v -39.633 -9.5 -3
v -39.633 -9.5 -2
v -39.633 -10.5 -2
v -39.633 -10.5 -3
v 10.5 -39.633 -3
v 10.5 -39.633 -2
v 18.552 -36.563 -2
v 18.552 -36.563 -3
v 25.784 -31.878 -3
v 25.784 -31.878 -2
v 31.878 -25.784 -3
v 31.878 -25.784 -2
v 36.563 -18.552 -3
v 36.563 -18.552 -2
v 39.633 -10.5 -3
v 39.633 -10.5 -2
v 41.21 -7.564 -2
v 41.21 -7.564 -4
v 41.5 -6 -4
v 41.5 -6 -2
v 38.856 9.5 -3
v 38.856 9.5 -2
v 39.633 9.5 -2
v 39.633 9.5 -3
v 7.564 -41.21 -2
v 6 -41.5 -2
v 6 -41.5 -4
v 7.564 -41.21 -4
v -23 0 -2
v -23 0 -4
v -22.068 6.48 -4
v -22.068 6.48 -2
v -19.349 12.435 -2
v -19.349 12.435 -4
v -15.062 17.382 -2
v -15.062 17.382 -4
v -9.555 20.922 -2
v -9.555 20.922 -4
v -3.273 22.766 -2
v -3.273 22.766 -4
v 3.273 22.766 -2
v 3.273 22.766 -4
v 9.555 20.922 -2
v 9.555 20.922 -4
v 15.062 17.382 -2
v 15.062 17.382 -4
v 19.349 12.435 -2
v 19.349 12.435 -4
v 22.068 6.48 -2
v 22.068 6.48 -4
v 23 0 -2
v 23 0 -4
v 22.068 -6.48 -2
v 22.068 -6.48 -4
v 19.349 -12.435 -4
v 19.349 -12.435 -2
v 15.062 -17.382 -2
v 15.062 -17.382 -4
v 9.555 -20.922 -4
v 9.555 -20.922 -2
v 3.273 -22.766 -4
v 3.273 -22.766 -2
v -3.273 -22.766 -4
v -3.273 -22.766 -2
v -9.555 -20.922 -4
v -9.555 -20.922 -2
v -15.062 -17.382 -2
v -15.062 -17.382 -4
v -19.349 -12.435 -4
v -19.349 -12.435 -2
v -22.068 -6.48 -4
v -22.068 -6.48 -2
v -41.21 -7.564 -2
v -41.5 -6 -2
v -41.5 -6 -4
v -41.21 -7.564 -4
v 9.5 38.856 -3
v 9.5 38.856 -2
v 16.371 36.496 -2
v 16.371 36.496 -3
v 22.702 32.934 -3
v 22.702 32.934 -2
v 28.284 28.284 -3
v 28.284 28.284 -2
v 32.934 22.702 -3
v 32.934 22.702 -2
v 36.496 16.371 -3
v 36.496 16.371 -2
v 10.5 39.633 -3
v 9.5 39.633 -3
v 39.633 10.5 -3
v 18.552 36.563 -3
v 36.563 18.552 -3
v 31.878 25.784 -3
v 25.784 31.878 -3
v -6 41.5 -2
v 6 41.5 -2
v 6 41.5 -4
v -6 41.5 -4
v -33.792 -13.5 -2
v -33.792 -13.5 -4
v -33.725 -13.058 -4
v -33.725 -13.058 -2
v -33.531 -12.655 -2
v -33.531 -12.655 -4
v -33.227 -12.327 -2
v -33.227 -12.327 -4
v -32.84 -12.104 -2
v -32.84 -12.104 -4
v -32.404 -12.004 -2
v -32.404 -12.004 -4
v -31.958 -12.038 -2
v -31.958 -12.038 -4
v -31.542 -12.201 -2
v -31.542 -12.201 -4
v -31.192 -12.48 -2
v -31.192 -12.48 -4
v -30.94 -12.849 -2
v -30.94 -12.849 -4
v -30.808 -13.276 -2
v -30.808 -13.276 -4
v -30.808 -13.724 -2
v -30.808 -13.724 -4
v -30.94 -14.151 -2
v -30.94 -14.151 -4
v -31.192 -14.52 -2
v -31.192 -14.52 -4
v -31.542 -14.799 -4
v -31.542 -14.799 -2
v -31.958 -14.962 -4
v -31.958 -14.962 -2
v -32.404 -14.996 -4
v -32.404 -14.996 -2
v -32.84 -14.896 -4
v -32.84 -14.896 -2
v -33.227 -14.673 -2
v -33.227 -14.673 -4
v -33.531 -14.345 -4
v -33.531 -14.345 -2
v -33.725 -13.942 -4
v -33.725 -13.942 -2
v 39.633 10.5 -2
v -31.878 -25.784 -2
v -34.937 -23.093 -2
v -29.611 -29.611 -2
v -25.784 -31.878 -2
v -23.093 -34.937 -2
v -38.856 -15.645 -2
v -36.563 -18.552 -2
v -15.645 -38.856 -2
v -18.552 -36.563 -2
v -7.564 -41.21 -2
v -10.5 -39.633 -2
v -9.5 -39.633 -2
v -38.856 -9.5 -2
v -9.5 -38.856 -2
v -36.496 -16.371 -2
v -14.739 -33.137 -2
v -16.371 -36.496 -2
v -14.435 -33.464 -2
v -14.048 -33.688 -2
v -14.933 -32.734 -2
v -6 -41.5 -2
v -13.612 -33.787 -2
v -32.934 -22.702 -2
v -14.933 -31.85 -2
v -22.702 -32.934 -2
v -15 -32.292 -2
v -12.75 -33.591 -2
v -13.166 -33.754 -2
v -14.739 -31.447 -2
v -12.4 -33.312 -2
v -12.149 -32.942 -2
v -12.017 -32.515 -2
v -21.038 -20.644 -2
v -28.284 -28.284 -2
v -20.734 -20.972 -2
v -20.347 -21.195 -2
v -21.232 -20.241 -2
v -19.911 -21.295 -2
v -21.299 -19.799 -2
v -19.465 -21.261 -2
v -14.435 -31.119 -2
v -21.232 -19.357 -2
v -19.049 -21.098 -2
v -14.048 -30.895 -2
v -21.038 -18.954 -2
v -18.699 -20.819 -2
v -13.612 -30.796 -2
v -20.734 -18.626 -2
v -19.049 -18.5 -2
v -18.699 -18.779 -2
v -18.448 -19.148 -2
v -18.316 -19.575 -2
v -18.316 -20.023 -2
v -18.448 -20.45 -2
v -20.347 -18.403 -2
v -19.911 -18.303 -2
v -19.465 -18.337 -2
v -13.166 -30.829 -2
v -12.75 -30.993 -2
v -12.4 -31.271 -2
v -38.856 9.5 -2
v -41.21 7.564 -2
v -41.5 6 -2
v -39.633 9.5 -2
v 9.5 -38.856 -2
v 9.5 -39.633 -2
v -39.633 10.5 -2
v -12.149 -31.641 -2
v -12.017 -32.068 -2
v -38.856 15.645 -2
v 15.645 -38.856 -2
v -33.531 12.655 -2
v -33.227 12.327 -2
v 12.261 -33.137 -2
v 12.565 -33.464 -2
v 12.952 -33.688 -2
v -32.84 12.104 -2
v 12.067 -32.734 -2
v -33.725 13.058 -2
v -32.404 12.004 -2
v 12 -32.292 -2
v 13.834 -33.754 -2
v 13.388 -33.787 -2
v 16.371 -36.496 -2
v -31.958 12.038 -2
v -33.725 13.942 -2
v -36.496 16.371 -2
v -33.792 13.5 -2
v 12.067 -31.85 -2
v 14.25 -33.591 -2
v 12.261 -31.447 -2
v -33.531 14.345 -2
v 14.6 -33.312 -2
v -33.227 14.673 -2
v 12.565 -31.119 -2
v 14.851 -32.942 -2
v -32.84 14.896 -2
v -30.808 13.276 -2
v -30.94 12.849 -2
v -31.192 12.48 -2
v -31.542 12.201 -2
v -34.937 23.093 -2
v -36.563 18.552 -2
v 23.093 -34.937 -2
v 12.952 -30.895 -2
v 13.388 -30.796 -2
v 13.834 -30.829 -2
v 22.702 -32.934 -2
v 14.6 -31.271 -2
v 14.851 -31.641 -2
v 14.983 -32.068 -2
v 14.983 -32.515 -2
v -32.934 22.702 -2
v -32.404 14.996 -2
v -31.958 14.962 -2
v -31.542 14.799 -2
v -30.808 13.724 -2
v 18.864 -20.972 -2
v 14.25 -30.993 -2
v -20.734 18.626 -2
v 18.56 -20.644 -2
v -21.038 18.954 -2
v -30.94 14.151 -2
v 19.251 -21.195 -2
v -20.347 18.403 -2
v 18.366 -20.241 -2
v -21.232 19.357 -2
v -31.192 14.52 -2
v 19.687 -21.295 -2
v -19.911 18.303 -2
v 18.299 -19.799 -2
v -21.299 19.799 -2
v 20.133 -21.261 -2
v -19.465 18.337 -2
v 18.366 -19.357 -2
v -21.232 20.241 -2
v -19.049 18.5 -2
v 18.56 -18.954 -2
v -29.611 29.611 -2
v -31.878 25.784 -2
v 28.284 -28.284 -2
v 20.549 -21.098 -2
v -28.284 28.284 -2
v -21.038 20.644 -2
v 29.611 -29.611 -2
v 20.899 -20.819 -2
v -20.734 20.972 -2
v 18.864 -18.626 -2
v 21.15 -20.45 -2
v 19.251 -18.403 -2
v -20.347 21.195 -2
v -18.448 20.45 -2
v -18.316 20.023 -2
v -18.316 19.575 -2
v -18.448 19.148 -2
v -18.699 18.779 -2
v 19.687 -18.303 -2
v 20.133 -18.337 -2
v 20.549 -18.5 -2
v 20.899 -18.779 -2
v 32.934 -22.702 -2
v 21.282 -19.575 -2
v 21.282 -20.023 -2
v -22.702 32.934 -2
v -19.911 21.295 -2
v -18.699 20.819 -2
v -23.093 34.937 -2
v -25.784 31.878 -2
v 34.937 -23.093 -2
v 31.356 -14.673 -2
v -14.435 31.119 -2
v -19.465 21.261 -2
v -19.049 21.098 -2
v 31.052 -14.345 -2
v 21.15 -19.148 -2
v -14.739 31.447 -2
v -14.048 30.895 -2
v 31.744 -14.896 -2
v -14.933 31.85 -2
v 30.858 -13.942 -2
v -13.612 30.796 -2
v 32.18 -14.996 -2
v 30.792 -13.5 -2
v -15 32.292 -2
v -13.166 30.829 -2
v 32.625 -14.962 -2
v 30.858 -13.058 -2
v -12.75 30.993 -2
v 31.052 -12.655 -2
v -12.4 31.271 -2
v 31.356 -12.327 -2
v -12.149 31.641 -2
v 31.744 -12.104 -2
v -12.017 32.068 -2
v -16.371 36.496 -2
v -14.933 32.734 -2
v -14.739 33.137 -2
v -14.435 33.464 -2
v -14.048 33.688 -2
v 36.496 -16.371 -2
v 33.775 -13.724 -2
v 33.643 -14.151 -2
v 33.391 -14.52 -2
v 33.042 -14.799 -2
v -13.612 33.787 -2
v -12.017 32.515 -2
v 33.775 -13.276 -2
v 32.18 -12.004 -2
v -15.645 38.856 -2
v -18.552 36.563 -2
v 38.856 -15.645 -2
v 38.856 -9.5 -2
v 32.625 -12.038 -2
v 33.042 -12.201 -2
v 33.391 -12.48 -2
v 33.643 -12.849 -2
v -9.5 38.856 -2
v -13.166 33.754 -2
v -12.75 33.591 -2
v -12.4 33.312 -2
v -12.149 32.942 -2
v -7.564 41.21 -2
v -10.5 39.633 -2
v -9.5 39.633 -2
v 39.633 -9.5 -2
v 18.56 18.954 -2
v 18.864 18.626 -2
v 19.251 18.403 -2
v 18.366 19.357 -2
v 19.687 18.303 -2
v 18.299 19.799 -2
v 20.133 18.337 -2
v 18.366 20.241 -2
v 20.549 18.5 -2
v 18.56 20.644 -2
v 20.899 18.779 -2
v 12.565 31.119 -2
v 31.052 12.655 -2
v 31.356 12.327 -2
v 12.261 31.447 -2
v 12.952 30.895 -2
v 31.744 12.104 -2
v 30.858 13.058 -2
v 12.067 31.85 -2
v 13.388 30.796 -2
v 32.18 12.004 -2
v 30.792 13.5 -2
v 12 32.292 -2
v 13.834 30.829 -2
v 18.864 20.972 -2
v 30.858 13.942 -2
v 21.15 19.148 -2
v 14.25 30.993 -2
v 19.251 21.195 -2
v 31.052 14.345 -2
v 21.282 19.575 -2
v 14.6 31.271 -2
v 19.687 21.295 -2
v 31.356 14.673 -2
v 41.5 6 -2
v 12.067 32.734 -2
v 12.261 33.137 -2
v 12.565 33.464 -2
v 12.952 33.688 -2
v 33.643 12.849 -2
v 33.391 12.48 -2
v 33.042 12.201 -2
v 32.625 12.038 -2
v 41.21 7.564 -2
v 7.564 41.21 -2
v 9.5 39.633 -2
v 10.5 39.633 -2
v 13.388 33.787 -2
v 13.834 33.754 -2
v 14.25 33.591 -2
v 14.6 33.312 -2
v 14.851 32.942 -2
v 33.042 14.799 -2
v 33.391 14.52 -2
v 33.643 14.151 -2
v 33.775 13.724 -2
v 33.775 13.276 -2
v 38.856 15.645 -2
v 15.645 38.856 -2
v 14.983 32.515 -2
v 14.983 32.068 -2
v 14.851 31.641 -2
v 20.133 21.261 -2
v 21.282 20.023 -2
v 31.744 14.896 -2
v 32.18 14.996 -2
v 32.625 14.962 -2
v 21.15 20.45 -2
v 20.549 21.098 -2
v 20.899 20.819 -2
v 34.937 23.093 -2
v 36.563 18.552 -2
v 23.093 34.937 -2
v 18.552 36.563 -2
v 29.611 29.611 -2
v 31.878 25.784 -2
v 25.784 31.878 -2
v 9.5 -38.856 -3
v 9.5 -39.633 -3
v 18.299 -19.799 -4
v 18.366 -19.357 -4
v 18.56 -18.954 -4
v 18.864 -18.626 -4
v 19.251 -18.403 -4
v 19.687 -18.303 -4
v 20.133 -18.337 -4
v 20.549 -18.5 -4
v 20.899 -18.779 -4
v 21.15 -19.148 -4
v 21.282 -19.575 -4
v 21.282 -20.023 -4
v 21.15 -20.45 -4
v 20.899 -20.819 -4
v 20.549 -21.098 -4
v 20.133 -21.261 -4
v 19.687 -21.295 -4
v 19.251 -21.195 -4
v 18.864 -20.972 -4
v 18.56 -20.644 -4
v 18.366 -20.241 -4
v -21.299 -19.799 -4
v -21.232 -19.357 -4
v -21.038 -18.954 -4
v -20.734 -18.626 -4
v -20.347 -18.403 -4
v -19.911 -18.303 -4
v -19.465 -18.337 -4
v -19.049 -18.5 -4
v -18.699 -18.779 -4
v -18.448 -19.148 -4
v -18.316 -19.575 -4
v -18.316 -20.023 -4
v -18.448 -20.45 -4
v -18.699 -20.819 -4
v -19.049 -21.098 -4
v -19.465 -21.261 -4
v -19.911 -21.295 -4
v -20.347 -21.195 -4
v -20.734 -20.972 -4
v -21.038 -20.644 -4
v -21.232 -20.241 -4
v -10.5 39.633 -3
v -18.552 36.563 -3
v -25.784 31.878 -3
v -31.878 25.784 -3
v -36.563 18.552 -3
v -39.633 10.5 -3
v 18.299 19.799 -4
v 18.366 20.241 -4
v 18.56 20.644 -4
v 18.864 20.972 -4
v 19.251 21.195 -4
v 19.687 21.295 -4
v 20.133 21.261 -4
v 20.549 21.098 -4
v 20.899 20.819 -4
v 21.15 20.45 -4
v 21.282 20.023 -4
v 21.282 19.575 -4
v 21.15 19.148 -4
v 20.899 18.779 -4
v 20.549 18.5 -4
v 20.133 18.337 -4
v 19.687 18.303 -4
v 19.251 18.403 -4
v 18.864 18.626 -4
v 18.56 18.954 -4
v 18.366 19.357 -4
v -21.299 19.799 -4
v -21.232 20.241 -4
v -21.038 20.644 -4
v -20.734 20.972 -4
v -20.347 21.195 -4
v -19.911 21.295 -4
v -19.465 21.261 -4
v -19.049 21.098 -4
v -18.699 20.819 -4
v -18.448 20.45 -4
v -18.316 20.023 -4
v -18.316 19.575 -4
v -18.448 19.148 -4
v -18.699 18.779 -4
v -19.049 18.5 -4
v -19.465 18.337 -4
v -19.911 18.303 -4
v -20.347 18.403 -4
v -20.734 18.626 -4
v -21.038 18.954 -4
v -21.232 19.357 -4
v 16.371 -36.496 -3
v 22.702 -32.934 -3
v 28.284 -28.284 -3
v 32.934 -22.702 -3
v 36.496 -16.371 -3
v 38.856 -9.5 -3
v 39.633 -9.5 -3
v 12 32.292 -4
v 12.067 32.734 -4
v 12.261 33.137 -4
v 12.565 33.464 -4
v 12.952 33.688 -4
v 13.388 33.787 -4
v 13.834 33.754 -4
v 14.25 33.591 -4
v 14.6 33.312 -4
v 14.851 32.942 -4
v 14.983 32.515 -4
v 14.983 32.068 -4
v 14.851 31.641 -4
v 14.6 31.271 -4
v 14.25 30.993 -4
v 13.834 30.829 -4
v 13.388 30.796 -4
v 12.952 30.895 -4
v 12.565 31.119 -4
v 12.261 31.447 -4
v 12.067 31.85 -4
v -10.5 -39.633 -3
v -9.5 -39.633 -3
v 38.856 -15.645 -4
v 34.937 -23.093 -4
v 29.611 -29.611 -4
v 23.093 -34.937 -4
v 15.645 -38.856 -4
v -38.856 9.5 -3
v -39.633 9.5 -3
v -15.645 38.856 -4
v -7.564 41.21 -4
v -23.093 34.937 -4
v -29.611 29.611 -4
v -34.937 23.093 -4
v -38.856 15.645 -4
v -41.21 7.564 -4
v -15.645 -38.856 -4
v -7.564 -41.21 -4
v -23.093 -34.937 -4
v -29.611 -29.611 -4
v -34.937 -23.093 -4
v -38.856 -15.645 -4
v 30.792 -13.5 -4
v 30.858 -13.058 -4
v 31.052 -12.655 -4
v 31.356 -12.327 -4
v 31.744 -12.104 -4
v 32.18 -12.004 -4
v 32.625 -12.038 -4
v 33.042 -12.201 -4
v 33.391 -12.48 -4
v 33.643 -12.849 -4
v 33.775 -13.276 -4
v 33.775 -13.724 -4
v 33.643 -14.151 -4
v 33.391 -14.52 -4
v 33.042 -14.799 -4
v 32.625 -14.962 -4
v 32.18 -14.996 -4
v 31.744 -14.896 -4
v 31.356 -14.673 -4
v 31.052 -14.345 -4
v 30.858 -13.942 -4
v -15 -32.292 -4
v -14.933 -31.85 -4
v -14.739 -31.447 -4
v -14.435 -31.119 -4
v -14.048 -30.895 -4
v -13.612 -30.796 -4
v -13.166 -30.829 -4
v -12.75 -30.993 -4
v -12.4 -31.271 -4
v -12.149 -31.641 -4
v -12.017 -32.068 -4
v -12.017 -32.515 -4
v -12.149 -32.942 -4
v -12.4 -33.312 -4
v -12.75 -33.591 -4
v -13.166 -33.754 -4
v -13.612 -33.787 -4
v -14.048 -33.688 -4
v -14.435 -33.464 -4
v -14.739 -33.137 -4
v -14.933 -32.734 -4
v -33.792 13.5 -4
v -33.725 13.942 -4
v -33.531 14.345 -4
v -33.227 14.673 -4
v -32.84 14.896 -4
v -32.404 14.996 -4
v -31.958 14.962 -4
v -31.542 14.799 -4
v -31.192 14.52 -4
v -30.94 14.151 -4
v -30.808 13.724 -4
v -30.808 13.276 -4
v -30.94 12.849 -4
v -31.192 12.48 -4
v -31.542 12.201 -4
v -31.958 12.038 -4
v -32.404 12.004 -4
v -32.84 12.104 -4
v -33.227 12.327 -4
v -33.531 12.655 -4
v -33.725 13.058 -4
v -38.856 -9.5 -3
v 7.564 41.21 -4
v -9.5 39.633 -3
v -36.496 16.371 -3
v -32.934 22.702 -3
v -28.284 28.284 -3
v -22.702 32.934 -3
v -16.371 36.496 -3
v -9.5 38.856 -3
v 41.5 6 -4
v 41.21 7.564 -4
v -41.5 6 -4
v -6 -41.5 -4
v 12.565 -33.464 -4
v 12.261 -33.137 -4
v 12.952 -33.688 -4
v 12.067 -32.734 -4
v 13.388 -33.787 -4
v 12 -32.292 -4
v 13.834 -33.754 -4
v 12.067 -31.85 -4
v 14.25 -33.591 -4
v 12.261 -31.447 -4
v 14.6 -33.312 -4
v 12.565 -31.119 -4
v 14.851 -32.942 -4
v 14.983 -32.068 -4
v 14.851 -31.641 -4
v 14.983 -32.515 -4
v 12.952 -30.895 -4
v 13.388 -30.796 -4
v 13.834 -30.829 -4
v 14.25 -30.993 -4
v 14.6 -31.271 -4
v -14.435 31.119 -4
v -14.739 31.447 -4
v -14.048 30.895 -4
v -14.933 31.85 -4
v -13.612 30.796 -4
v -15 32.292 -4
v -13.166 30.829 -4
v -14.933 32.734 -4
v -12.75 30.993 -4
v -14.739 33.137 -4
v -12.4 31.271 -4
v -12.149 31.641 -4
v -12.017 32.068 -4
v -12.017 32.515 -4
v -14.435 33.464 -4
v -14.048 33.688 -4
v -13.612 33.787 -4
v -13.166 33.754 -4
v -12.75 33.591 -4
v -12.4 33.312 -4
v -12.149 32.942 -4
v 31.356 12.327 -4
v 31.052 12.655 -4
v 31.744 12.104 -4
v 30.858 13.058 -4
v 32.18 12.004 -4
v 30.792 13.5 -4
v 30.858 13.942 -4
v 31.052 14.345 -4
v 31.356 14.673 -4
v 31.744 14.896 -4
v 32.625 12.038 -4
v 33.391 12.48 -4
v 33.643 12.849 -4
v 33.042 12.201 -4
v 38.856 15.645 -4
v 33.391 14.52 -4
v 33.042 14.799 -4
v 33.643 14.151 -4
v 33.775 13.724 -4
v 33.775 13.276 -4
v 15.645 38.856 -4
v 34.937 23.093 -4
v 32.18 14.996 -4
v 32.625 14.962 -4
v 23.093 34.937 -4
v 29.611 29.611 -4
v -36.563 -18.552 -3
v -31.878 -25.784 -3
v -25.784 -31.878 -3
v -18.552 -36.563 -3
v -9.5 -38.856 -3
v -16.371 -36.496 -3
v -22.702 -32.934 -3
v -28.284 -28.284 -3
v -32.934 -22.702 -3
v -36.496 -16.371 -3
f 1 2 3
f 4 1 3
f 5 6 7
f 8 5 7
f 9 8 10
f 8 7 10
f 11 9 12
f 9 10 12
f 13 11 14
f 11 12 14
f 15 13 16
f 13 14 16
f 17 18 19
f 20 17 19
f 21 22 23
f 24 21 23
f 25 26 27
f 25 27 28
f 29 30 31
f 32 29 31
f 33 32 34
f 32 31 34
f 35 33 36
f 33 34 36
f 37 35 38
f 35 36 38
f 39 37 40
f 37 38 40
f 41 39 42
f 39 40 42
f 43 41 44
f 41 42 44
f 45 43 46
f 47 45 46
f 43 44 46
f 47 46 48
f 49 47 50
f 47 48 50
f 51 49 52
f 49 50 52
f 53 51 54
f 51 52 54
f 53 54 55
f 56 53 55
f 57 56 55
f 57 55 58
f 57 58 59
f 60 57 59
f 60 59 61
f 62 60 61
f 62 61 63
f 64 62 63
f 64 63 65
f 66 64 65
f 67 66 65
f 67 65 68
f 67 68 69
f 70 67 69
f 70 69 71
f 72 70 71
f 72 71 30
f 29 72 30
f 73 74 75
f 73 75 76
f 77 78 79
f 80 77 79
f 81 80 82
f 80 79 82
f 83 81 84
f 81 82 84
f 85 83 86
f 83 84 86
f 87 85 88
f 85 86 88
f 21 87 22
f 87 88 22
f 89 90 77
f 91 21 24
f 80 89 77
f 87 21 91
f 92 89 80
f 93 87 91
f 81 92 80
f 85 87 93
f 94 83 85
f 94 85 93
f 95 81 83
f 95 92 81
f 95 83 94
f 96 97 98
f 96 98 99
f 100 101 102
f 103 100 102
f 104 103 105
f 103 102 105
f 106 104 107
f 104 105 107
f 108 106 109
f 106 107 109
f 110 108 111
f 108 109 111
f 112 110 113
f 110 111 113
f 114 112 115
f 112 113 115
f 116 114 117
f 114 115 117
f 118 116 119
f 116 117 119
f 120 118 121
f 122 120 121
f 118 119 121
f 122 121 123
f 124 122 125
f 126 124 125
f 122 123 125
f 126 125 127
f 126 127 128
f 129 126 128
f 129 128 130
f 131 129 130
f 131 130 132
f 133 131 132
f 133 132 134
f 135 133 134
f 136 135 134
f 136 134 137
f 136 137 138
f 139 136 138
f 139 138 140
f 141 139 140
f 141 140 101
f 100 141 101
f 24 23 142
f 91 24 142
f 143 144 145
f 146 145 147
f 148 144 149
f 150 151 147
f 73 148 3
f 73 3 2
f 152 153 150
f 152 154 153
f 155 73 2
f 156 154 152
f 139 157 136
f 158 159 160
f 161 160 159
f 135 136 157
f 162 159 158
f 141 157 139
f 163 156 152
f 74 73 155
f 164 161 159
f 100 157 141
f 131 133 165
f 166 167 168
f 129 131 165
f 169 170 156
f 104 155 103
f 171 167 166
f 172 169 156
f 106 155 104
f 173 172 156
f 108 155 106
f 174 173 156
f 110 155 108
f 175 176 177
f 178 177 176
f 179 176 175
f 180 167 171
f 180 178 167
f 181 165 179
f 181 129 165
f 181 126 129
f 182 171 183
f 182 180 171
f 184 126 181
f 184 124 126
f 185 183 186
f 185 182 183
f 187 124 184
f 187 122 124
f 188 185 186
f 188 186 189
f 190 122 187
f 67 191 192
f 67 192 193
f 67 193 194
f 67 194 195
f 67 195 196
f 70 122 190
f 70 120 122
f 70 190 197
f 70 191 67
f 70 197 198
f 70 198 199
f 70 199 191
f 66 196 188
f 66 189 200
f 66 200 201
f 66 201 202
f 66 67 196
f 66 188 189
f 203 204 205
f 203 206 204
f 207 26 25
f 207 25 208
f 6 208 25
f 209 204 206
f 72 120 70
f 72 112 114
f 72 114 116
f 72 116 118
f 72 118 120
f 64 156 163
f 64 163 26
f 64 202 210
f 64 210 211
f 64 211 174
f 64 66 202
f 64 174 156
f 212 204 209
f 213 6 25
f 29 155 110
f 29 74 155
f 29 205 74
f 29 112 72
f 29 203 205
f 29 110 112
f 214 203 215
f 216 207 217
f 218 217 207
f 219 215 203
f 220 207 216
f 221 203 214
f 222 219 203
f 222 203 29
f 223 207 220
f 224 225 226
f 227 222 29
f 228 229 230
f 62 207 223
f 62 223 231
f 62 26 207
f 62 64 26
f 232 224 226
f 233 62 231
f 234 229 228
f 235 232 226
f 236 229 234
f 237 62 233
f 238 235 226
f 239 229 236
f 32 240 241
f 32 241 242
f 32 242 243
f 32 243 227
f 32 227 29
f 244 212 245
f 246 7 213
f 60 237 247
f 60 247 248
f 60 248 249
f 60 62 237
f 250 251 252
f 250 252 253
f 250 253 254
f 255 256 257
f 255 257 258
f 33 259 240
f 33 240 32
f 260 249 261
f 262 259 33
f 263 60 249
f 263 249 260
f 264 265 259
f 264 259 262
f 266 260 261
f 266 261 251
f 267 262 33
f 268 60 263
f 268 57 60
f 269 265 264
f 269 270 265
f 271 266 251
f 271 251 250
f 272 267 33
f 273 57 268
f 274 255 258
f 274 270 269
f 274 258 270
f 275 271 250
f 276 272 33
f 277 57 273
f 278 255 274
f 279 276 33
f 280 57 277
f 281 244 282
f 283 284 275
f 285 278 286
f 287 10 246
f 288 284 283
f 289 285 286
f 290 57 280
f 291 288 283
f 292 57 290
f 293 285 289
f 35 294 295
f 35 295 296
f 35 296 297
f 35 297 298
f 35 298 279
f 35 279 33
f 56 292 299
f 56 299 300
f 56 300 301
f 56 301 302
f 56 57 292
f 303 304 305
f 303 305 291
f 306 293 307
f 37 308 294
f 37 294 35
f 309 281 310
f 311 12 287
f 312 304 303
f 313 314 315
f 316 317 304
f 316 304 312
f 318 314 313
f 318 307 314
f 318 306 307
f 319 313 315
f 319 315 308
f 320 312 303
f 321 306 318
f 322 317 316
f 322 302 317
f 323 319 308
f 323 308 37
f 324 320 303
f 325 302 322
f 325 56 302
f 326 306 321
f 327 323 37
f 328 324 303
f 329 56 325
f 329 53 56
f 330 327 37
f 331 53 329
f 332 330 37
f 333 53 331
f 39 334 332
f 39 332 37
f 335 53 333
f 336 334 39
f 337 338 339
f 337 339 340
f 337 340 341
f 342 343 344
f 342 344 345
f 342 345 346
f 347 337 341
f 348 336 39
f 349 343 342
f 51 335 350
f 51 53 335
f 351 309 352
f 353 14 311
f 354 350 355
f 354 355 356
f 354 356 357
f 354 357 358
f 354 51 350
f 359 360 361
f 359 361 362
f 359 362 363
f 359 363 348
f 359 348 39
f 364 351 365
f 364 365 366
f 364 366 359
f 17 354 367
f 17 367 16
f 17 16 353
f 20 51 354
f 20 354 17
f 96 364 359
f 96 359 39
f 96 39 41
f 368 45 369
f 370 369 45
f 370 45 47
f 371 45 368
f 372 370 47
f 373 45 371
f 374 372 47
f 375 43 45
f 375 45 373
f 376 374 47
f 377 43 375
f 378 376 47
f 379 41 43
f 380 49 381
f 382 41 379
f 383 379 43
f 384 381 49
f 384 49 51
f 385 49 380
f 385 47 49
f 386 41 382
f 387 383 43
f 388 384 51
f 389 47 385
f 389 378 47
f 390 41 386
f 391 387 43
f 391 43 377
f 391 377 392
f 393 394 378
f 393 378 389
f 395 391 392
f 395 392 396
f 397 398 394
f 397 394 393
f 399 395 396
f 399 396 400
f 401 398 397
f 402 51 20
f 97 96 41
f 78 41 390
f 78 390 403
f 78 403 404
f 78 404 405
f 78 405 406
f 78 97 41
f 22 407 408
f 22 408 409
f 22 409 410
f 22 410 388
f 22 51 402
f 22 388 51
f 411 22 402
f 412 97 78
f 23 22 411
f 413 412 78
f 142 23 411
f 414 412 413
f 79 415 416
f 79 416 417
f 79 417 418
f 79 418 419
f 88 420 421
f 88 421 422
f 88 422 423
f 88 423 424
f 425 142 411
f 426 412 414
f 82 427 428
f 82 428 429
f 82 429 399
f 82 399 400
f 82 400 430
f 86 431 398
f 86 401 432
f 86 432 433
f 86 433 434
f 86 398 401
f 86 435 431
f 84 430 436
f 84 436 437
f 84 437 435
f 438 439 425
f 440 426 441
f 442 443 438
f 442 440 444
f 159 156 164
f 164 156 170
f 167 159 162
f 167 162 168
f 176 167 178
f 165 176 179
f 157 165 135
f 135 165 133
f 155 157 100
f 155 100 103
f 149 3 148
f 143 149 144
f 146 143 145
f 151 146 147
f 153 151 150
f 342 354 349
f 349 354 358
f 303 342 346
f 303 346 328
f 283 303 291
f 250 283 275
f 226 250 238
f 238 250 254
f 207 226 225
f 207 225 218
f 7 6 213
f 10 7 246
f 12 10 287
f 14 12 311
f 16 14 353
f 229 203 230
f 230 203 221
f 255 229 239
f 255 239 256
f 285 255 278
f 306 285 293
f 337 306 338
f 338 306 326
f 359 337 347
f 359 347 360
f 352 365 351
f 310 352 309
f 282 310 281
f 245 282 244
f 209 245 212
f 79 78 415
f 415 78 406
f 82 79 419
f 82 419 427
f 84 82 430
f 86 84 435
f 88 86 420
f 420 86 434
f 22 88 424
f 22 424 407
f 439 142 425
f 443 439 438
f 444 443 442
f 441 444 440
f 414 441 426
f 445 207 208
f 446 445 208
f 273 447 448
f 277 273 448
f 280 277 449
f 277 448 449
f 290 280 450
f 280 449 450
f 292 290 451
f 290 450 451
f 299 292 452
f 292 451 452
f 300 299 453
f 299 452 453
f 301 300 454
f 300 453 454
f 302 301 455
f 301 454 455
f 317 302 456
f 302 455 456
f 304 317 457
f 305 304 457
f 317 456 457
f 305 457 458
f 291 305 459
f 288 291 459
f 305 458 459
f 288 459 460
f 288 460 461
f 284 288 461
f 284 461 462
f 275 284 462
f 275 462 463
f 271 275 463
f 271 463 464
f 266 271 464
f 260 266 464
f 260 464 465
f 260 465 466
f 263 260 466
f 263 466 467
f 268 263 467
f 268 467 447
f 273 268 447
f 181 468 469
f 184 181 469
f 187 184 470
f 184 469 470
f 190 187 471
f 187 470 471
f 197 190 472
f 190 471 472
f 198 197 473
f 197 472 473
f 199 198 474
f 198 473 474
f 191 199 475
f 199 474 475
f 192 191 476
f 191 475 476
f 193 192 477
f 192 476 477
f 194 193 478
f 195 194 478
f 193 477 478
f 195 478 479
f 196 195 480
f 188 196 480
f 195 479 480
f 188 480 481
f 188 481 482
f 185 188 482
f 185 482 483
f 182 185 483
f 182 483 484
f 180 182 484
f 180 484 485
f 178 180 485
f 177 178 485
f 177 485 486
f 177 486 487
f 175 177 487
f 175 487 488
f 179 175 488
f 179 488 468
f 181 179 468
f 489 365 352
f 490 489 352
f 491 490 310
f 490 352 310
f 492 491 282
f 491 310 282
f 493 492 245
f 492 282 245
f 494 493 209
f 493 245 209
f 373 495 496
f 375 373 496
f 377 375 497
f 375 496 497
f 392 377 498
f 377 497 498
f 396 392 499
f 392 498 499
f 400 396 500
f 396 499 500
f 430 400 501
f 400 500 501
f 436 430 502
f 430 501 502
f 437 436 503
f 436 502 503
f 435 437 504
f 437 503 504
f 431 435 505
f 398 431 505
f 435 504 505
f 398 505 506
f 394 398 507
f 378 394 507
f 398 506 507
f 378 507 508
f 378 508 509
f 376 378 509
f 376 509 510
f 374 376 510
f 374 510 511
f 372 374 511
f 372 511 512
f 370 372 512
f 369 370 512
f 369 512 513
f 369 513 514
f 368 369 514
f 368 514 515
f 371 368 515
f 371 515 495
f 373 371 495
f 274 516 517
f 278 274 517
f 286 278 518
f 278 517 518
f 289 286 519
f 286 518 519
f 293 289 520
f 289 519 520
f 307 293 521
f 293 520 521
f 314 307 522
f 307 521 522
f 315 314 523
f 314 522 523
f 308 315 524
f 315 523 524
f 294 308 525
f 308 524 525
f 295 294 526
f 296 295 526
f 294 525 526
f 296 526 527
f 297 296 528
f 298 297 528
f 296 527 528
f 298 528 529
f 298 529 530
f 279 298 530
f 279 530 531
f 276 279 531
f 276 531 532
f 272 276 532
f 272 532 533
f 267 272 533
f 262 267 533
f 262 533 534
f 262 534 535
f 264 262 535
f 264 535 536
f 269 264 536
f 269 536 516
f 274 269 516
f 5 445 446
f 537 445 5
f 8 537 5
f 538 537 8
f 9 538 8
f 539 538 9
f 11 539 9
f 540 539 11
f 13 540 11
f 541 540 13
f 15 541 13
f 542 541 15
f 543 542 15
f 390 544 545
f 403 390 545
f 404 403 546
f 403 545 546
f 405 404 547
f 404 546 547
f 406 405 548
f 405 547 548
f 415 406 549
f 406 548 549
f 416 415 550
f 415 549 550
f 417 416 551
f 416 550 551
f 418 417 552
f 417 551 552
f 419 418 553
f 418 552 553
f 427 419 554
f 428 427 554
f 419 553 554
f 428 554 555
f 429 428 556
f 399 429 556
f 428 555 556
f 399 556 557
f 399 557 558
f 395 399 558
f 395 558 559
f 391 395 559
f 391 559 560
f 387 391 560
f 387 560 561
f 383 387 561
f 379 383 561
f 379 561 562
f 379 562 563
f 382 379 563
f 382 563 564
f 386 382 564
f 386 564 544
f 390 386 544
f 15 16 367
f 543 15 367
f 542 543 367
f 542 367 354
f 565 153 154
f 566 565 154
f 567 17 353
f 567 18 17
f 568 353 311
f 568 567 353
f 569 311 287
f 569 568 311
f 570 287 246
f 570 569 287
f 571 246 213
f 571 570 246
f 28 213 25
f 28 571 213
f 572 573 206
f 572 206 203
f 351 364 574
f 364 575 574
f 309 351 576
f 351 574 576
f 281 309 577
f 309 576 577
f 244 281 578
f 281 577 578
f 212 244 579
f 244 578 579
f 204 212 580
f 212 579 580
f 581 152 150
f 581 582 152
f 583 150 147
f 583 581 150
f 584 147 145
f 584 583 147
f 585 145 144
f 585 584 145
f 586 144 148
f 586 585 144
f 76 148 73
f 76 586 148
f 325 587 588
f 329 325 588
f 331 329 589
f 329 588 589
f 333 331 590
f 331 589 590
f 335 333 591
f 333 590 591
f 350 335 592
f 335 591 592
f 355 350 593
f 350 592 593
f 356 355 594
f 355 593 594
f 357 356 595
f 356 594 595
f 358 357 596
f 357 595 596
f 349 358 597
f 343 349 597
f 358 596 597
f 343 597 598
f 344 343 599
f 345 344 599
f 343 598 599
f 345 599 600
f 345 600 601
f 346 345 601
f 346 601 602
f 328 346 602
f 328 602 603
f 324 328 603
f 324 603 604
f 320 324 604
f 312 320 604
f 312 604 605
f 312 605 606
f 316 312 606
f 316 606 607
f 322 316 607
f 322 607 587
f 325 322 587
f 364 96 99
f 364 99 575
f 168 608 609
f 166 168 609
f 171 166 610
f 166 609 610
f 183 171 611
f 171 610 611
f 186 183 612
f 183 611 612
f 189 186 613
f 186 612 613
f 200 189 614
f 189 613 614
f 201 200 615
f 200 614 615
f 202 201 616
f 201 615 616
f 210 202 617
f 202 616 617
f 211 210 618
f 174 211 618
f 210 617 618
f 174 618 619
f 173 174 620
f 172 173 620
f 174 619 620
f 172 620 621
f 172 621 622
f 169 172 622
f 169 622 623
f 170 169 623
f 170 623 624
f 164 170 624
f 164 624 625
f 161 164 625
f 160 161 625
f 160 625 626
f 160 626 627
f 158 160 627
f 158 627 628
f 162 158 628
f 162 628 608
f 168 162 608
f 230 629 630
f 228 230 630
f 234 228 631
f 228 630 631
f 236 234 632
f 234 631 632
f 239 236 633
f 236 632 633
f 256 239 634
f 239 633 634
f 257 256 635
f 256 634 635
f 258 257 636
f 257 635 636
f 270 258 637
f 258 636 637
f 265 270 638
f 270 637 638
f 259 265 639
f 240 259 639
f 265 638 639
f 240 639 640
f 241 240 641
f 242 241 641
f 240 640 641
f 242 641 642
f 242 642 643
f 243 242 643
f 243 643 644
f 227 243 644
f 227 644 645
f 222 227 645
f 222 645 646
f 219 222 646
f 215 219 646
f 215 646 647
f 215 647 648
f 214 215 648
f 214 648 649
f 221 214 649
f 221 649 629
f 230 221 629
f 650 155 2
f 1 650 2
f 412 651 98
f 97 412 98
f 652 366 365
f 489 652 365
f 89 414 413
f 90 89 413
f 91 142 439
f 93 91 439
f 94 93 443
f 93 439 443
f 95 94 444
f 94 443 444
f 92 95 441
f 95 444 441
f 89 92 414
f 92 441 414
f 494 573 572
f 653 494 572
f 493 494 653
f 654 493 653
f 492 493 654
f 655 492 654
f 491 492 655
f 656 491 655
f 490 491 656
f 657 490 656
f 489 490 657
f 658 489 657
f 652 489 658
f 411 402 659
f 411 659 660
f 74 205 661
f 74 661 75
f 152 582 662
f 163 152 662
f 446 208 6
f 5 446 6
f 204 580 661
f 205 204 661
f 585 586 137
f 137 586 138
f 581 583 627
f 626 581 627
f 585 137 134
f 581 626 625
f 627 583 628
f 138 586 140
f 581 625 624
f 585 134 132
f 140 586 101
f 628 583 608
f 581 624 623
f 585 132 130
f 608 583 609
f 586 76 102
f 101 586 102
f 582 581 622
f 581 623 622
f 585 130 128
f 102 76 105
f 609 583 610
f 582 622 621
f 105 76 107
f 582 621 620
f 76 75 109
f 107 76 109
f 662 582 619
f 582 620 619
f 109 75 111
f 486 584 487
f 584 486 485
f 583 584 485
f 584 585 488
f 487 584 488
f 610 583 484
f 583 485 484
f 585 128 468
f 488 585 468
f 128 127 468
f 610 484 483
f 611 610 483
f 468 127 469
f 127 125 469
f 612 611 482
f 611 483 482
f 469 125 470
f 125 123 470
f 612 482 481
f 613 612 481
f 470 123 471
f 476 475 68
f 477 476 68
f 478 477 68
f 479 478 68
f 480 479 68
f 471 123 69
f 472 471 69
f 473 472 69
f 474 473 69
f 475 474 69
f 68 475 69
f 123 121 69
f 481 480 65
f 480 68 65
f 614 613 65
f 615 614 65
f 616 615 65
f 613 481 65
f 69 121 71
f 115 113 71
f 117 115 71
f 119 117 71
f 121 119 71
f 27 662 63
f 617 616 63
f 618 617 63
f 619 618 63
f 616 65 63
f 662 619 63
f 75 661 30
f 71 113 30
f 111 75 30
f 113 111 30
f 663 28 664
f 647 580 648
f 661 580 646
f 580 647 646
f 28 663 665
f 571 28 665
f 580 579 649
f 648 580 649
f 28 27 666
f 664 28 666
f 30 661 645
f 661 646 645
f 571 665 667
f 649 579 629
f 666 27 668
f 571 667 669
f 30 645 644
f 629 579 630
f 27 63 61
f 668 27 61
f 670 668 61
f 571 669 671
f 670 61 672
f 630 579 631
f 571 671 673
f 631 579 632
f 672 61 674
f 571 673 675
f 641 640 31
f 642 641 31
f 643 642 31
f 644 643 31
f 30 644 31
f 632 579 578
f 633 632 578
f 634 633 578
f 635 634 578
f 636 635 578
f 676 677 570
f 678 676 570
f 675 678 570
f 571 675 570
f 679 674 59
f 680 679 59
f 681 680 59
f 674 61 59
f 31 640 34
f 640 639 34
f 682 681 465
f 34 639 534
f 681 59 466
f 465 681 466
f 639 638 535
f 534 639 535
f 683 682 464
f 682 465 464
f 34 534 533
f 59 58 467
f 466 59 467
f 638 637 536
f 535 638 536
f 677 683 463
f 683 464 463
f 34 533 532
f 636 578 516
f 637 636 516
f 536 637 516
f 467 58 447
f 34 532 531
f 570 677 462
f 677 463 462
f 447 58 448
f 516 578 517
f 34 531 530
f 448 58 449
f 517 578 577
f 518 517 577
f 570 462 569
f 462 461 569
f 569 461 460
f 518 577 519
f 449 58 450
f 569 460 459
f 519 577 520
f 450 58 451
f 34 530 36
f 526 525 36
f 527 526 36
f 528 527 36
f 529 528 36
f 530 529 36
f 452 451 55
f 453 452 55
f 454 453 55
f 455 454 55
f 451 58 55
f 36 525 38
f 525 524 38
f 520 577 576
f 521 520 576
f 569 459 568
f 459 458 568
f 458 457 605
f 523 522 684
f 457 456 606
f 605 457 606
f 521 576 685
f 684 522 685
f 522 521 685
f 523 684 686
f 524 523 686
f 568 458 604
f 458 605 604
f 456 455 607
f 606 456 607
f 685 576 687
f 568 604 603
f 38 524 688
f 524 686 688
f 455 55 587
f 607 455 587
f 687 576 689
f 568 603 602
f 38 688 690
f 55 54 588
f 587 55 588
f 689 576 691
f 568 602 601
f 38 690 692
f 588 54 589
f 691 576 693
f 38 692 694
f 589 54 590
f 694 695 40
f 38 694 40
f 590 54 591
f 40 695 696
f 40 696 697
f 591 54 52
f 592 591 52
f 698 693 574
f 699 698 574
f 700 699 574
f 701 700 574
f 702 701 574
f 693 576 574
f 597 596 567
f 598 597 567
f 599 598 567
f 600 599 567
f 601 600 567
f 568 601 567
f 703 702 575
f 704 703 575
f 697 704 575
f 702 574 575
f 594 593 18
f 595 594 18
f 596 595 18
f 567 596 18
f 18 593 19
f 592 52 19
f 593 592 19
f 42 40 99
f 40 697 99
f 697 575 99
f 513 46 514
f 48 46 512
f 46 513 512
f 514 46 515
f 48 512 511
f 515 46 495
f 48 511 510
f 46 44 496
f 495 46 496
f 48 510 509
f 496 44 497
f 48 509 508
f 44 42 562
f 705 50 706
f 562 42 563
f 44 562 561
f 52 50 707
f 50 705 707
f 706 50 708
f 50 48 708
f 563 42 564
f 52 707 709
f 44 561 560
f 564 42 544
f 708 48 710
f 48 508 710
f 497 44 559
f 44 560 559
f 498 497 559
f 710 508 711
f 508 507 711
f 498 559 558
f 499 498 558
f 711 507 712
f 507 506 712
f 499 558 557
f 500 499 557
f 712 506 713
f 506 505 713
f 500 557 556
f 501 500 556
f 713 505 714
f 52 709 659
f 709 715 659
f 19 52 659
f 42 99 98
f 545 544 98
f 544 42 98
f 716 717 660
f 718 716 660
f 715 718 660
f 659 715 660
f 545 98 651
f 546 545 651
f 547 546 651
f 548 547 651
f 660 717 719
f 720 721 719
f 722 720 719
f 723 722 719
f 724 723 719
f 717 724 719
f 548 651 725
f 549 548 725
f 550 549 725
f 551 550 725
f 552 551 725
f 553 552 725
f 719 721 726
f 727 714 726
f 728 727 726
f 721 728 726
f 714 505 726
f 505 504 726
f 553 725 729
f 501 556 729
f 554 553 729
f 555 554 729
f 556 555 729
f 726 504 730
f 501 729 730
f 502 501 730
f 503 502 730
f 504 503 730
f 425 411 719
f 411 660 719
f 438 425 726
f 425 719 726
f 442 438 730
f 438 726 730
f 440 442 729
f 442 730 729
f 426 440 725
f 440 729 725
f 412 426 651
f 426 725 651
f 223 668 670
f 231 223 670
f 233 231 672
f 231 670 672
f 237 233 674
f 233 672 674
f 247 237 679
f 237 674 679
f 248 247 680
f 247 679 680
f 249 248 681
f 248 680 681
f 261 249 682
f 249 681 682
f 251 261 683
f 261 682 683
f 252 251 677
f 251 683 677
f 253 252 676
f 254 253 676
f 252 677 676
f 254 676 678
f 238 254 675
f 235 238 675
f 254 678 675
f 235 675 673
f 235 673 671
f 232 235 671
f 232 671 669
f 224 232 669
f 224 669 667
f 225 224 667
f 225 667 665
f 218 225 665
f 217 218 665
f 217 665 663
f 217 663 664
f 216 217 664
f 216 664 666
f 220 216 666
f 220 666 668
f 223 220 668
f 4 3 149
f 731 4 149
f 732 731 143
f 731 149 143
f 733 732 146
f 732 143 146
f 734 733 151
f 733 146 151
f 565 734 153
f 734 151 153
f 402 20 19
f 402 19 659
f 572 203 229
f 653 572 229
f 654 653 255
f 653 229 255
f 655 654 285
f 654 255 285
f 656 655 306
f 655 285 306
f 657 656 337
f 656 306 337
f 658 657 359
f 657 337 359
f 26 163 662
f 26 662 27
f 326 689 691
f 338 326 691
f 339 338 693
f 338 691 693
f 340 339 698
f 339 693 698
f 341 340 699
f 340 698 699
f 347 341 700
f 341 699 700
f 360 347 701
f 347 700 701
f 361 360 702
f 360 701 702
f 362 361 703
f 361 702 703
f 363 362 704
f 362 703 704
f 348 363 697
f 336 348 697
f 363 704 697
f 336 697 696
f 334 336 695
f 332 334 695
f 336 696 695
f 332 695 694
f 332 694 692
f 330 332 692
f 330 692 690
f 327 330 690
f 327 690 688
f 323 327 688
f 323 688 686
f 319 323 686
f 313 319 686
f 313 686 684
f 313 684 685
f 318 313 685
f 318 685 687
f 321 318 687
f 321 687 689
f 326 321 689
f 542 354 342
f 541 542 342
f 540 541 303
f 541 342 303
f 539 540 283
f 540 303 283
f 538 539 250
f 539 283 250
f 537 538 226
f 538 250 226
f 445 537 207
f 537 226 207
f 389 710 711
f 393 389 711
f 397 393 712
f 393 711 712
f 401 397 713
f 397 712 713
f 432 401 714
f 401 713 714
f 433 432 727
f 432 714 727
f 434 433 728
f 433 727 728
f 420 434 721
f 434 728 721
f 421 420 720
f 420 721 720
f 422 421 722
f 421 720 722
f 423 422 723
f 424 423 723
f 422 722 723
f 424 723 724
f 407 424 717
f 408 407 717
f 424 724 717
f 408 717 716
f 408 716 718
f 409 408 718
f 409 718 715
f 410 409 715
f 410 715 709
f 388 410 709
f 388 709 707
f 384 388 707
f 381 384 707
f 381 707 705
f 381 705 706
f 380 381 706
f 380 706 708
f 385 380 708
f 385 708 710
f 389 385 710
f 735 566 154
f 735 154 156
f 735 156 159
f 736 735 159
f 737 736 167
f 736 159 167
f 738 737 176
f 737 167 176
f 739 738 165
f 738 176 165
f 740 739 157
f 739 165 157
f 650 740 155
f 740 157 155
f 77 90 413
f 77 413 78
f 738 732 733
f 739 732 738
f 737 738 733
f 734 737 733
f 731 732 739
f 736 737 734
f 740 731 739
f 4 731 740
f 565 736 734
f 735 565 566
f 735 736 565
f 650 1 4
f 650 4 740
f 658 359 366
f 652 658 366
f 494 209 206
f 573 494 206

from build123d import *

# Parameters (mm, degrees)
EXTRUDE_1_DEPTH       = 2
CUT_EXTRUDE_1_DEPTH   = 1
CUT_EXTRUDE_2_DEPTH   = 1
CUT_EXTRUDE_3_DEPTH   = 1
CUT_EXTRUDE_4_DEPTH   = 1
HOLE_WIZARD_3_0_3_1_D = 3
HOLE_WIZARD_M421_D    = 46
FILLET_1_R            = 42


with BuildPart() as part:
    # Эскиз1 → Бобышка-Вытянуть1 (new body)
    with BuildSketch(Plane.XY.offset(-2)):
        Polygon((41.5, 6), (35.95120701, 35.95120701), (6, 41.5), (-6, 41.5), (-35.95120701, 35.95120701), (-41.5, 6), (-41.5, -6), (-35.95120701, -35.95120701), (-6, -41.5), (6, -41.5), (35.95120701, -35.95120701), (41.5, -6), align=None)
    extrude(amount=-EXTRUDE_1_DEPTH)

    # Эскиз2 → Вырез-Вытянуть1 (cut)
    with BuildSketch(Plane.XY.offset(-2)):
        with BuildLine():
            Line((9.5, -39.632688529), (10.5, -39.632688529))
            ThreePointArc((10.5, -39.632688529), (28.991378029, -28.991378029), (39.632688529, -10.5))
            Line((39.632688529, -10.5), (39.632688529, -9.5))
            Line((39.632688529, -9.5), (38.855501541, -9.5))
            ThreePointArc((38.855501541, -9.5), (28.284271247, -28.284271247), (9.5, -38.855501541))
            Line((9.5, -38.855501541), (9.5, -39.632688529))
        make_face()
    extrude(amount=-CUT_EXTRUDE_1_DEPTH, mode=Mode.SUBTRACT)

    # Эскиз3 → Вырез-Вытянуть2 (cut)
    with BuildSketch(Plane.XY.offset(-2)):
        with BuildLine():
            Line((-39.632688529, -9.5), (-39.632688529, -10.5))
            ThreePointArc((-39.632688529, -10.5), (-28.991378029, -28.991378029), (-10.5, -39.632688529))
            Line((-10.5, -39.632688529), (-9.5, -39.632688529))
            Line((-9.5, -39.632688529), (-9.5, -38.855501541))
            ThreePointArc((-9.5, -38.855501541), (-28.284271247, -28.284271247), (-38.855501541, -9.5))
            Line((-38.855501541, -9.5), (-39.632688529, -9.5))
        make_face()
    extrude(amount=-CUT_EXTRUDE_2_DEPTH, mode=Mode.SUBTRACT)

    # Эскиз4 → Вырез-Вытянуть3 (cut)
    with BuildSketch(Plane.XY.offset(-2)):
        with BuildLine():
            Line((39.632688529, 9.5), (39.632688529, 10.5))
            ThreePointArc((39.632688529, 10.5), (28.991378029, 28.991378029), (10.5, 39.632688529))
            Line((10.5, 39.632688529), (9.5, 39.632688529))
            Line((9.5, 39.632688529), (9.5, 38.855501541))
            ThreePointArc((9.5, 38.855501541), (28.284271247, 28.284271247), (38.855501541, 9.5))
            Line((38.855501541, 9.5), (39.632688529, 9.5))
        make_face()
    extrude(amount=-CUT_EXTRUDE_3_DEPTH, mode=Mode.SUBTRACT)

    # Эскиз5 → Вырез-Вытянуть4 (cut)
    with BuildSketch(Plane.XY.offset(-2)):
        with BuildLine():
            Line((-9.5, 39.632688529), (-10.5, 39.632688529))
            ThreePointArc((-10.5, 39.632688529), (-28.991378029, 28.991378029), (-39.632688529, 10.5))
            Line((-39.632688529, 10.5), (-39.632688529, 9.5))
            Line((-39.632688529, 9.5), (-38.855501541, 9.5))
            ThreePointArc((-38.855501541, 9.5), (-28.284271247, 28.284271247), (-9.5, 38.855501541))
            Line((-9.5, 38.855501541), (-9.5, 39.632688529))
        make_face()
    extrude(amount=-CUT_EXTRUDE_4_DEPTH, mode=Mode.SUBTRACT)

    # Диаметр отверстия Ø3.0 (3)1 (through all)
    with Locations(Plane.XY.offset(-2)):
        with Locations((32.291639785, -13.5), (32.291639785, 13.5), (19.798989873, 19.798989873), (19.798989873, -19.798989873), (13.5, -32.291639785), (-13.5, -32.291639785), (-19.798989873, -19.798989873), (-19.798989873, 19.798989873), (-13.5, 32.291639785), (13.5, 32.291639785), (-32.291639785, 13.5), (-32.291639785, -13.5)):
            Hole(HOLE_WIZARD_3_0_3_1_D / 2)

    # Отверстие с зазором M421 (through all)
    with Locations(Plane.XY.offset(-2)):
        with Locations((0, 0)):
            Hole(HOLE_WIZARD_M421_D / 2)

    # Скругление1
    fillet_1_edges = [part.edges().sort_by_distance(p)[0] for p in [
        (35.95120701, -35.95120701, -3),
        (-35.95120701, -35.95120701, -3),
        (-35.95120701, 35.95120701, -3),
        (35.95120701, 35.95120701, -3),
    ]]
    fillet(fillet_1_edges, radius=FILLET_1_R)


solid = part.part
